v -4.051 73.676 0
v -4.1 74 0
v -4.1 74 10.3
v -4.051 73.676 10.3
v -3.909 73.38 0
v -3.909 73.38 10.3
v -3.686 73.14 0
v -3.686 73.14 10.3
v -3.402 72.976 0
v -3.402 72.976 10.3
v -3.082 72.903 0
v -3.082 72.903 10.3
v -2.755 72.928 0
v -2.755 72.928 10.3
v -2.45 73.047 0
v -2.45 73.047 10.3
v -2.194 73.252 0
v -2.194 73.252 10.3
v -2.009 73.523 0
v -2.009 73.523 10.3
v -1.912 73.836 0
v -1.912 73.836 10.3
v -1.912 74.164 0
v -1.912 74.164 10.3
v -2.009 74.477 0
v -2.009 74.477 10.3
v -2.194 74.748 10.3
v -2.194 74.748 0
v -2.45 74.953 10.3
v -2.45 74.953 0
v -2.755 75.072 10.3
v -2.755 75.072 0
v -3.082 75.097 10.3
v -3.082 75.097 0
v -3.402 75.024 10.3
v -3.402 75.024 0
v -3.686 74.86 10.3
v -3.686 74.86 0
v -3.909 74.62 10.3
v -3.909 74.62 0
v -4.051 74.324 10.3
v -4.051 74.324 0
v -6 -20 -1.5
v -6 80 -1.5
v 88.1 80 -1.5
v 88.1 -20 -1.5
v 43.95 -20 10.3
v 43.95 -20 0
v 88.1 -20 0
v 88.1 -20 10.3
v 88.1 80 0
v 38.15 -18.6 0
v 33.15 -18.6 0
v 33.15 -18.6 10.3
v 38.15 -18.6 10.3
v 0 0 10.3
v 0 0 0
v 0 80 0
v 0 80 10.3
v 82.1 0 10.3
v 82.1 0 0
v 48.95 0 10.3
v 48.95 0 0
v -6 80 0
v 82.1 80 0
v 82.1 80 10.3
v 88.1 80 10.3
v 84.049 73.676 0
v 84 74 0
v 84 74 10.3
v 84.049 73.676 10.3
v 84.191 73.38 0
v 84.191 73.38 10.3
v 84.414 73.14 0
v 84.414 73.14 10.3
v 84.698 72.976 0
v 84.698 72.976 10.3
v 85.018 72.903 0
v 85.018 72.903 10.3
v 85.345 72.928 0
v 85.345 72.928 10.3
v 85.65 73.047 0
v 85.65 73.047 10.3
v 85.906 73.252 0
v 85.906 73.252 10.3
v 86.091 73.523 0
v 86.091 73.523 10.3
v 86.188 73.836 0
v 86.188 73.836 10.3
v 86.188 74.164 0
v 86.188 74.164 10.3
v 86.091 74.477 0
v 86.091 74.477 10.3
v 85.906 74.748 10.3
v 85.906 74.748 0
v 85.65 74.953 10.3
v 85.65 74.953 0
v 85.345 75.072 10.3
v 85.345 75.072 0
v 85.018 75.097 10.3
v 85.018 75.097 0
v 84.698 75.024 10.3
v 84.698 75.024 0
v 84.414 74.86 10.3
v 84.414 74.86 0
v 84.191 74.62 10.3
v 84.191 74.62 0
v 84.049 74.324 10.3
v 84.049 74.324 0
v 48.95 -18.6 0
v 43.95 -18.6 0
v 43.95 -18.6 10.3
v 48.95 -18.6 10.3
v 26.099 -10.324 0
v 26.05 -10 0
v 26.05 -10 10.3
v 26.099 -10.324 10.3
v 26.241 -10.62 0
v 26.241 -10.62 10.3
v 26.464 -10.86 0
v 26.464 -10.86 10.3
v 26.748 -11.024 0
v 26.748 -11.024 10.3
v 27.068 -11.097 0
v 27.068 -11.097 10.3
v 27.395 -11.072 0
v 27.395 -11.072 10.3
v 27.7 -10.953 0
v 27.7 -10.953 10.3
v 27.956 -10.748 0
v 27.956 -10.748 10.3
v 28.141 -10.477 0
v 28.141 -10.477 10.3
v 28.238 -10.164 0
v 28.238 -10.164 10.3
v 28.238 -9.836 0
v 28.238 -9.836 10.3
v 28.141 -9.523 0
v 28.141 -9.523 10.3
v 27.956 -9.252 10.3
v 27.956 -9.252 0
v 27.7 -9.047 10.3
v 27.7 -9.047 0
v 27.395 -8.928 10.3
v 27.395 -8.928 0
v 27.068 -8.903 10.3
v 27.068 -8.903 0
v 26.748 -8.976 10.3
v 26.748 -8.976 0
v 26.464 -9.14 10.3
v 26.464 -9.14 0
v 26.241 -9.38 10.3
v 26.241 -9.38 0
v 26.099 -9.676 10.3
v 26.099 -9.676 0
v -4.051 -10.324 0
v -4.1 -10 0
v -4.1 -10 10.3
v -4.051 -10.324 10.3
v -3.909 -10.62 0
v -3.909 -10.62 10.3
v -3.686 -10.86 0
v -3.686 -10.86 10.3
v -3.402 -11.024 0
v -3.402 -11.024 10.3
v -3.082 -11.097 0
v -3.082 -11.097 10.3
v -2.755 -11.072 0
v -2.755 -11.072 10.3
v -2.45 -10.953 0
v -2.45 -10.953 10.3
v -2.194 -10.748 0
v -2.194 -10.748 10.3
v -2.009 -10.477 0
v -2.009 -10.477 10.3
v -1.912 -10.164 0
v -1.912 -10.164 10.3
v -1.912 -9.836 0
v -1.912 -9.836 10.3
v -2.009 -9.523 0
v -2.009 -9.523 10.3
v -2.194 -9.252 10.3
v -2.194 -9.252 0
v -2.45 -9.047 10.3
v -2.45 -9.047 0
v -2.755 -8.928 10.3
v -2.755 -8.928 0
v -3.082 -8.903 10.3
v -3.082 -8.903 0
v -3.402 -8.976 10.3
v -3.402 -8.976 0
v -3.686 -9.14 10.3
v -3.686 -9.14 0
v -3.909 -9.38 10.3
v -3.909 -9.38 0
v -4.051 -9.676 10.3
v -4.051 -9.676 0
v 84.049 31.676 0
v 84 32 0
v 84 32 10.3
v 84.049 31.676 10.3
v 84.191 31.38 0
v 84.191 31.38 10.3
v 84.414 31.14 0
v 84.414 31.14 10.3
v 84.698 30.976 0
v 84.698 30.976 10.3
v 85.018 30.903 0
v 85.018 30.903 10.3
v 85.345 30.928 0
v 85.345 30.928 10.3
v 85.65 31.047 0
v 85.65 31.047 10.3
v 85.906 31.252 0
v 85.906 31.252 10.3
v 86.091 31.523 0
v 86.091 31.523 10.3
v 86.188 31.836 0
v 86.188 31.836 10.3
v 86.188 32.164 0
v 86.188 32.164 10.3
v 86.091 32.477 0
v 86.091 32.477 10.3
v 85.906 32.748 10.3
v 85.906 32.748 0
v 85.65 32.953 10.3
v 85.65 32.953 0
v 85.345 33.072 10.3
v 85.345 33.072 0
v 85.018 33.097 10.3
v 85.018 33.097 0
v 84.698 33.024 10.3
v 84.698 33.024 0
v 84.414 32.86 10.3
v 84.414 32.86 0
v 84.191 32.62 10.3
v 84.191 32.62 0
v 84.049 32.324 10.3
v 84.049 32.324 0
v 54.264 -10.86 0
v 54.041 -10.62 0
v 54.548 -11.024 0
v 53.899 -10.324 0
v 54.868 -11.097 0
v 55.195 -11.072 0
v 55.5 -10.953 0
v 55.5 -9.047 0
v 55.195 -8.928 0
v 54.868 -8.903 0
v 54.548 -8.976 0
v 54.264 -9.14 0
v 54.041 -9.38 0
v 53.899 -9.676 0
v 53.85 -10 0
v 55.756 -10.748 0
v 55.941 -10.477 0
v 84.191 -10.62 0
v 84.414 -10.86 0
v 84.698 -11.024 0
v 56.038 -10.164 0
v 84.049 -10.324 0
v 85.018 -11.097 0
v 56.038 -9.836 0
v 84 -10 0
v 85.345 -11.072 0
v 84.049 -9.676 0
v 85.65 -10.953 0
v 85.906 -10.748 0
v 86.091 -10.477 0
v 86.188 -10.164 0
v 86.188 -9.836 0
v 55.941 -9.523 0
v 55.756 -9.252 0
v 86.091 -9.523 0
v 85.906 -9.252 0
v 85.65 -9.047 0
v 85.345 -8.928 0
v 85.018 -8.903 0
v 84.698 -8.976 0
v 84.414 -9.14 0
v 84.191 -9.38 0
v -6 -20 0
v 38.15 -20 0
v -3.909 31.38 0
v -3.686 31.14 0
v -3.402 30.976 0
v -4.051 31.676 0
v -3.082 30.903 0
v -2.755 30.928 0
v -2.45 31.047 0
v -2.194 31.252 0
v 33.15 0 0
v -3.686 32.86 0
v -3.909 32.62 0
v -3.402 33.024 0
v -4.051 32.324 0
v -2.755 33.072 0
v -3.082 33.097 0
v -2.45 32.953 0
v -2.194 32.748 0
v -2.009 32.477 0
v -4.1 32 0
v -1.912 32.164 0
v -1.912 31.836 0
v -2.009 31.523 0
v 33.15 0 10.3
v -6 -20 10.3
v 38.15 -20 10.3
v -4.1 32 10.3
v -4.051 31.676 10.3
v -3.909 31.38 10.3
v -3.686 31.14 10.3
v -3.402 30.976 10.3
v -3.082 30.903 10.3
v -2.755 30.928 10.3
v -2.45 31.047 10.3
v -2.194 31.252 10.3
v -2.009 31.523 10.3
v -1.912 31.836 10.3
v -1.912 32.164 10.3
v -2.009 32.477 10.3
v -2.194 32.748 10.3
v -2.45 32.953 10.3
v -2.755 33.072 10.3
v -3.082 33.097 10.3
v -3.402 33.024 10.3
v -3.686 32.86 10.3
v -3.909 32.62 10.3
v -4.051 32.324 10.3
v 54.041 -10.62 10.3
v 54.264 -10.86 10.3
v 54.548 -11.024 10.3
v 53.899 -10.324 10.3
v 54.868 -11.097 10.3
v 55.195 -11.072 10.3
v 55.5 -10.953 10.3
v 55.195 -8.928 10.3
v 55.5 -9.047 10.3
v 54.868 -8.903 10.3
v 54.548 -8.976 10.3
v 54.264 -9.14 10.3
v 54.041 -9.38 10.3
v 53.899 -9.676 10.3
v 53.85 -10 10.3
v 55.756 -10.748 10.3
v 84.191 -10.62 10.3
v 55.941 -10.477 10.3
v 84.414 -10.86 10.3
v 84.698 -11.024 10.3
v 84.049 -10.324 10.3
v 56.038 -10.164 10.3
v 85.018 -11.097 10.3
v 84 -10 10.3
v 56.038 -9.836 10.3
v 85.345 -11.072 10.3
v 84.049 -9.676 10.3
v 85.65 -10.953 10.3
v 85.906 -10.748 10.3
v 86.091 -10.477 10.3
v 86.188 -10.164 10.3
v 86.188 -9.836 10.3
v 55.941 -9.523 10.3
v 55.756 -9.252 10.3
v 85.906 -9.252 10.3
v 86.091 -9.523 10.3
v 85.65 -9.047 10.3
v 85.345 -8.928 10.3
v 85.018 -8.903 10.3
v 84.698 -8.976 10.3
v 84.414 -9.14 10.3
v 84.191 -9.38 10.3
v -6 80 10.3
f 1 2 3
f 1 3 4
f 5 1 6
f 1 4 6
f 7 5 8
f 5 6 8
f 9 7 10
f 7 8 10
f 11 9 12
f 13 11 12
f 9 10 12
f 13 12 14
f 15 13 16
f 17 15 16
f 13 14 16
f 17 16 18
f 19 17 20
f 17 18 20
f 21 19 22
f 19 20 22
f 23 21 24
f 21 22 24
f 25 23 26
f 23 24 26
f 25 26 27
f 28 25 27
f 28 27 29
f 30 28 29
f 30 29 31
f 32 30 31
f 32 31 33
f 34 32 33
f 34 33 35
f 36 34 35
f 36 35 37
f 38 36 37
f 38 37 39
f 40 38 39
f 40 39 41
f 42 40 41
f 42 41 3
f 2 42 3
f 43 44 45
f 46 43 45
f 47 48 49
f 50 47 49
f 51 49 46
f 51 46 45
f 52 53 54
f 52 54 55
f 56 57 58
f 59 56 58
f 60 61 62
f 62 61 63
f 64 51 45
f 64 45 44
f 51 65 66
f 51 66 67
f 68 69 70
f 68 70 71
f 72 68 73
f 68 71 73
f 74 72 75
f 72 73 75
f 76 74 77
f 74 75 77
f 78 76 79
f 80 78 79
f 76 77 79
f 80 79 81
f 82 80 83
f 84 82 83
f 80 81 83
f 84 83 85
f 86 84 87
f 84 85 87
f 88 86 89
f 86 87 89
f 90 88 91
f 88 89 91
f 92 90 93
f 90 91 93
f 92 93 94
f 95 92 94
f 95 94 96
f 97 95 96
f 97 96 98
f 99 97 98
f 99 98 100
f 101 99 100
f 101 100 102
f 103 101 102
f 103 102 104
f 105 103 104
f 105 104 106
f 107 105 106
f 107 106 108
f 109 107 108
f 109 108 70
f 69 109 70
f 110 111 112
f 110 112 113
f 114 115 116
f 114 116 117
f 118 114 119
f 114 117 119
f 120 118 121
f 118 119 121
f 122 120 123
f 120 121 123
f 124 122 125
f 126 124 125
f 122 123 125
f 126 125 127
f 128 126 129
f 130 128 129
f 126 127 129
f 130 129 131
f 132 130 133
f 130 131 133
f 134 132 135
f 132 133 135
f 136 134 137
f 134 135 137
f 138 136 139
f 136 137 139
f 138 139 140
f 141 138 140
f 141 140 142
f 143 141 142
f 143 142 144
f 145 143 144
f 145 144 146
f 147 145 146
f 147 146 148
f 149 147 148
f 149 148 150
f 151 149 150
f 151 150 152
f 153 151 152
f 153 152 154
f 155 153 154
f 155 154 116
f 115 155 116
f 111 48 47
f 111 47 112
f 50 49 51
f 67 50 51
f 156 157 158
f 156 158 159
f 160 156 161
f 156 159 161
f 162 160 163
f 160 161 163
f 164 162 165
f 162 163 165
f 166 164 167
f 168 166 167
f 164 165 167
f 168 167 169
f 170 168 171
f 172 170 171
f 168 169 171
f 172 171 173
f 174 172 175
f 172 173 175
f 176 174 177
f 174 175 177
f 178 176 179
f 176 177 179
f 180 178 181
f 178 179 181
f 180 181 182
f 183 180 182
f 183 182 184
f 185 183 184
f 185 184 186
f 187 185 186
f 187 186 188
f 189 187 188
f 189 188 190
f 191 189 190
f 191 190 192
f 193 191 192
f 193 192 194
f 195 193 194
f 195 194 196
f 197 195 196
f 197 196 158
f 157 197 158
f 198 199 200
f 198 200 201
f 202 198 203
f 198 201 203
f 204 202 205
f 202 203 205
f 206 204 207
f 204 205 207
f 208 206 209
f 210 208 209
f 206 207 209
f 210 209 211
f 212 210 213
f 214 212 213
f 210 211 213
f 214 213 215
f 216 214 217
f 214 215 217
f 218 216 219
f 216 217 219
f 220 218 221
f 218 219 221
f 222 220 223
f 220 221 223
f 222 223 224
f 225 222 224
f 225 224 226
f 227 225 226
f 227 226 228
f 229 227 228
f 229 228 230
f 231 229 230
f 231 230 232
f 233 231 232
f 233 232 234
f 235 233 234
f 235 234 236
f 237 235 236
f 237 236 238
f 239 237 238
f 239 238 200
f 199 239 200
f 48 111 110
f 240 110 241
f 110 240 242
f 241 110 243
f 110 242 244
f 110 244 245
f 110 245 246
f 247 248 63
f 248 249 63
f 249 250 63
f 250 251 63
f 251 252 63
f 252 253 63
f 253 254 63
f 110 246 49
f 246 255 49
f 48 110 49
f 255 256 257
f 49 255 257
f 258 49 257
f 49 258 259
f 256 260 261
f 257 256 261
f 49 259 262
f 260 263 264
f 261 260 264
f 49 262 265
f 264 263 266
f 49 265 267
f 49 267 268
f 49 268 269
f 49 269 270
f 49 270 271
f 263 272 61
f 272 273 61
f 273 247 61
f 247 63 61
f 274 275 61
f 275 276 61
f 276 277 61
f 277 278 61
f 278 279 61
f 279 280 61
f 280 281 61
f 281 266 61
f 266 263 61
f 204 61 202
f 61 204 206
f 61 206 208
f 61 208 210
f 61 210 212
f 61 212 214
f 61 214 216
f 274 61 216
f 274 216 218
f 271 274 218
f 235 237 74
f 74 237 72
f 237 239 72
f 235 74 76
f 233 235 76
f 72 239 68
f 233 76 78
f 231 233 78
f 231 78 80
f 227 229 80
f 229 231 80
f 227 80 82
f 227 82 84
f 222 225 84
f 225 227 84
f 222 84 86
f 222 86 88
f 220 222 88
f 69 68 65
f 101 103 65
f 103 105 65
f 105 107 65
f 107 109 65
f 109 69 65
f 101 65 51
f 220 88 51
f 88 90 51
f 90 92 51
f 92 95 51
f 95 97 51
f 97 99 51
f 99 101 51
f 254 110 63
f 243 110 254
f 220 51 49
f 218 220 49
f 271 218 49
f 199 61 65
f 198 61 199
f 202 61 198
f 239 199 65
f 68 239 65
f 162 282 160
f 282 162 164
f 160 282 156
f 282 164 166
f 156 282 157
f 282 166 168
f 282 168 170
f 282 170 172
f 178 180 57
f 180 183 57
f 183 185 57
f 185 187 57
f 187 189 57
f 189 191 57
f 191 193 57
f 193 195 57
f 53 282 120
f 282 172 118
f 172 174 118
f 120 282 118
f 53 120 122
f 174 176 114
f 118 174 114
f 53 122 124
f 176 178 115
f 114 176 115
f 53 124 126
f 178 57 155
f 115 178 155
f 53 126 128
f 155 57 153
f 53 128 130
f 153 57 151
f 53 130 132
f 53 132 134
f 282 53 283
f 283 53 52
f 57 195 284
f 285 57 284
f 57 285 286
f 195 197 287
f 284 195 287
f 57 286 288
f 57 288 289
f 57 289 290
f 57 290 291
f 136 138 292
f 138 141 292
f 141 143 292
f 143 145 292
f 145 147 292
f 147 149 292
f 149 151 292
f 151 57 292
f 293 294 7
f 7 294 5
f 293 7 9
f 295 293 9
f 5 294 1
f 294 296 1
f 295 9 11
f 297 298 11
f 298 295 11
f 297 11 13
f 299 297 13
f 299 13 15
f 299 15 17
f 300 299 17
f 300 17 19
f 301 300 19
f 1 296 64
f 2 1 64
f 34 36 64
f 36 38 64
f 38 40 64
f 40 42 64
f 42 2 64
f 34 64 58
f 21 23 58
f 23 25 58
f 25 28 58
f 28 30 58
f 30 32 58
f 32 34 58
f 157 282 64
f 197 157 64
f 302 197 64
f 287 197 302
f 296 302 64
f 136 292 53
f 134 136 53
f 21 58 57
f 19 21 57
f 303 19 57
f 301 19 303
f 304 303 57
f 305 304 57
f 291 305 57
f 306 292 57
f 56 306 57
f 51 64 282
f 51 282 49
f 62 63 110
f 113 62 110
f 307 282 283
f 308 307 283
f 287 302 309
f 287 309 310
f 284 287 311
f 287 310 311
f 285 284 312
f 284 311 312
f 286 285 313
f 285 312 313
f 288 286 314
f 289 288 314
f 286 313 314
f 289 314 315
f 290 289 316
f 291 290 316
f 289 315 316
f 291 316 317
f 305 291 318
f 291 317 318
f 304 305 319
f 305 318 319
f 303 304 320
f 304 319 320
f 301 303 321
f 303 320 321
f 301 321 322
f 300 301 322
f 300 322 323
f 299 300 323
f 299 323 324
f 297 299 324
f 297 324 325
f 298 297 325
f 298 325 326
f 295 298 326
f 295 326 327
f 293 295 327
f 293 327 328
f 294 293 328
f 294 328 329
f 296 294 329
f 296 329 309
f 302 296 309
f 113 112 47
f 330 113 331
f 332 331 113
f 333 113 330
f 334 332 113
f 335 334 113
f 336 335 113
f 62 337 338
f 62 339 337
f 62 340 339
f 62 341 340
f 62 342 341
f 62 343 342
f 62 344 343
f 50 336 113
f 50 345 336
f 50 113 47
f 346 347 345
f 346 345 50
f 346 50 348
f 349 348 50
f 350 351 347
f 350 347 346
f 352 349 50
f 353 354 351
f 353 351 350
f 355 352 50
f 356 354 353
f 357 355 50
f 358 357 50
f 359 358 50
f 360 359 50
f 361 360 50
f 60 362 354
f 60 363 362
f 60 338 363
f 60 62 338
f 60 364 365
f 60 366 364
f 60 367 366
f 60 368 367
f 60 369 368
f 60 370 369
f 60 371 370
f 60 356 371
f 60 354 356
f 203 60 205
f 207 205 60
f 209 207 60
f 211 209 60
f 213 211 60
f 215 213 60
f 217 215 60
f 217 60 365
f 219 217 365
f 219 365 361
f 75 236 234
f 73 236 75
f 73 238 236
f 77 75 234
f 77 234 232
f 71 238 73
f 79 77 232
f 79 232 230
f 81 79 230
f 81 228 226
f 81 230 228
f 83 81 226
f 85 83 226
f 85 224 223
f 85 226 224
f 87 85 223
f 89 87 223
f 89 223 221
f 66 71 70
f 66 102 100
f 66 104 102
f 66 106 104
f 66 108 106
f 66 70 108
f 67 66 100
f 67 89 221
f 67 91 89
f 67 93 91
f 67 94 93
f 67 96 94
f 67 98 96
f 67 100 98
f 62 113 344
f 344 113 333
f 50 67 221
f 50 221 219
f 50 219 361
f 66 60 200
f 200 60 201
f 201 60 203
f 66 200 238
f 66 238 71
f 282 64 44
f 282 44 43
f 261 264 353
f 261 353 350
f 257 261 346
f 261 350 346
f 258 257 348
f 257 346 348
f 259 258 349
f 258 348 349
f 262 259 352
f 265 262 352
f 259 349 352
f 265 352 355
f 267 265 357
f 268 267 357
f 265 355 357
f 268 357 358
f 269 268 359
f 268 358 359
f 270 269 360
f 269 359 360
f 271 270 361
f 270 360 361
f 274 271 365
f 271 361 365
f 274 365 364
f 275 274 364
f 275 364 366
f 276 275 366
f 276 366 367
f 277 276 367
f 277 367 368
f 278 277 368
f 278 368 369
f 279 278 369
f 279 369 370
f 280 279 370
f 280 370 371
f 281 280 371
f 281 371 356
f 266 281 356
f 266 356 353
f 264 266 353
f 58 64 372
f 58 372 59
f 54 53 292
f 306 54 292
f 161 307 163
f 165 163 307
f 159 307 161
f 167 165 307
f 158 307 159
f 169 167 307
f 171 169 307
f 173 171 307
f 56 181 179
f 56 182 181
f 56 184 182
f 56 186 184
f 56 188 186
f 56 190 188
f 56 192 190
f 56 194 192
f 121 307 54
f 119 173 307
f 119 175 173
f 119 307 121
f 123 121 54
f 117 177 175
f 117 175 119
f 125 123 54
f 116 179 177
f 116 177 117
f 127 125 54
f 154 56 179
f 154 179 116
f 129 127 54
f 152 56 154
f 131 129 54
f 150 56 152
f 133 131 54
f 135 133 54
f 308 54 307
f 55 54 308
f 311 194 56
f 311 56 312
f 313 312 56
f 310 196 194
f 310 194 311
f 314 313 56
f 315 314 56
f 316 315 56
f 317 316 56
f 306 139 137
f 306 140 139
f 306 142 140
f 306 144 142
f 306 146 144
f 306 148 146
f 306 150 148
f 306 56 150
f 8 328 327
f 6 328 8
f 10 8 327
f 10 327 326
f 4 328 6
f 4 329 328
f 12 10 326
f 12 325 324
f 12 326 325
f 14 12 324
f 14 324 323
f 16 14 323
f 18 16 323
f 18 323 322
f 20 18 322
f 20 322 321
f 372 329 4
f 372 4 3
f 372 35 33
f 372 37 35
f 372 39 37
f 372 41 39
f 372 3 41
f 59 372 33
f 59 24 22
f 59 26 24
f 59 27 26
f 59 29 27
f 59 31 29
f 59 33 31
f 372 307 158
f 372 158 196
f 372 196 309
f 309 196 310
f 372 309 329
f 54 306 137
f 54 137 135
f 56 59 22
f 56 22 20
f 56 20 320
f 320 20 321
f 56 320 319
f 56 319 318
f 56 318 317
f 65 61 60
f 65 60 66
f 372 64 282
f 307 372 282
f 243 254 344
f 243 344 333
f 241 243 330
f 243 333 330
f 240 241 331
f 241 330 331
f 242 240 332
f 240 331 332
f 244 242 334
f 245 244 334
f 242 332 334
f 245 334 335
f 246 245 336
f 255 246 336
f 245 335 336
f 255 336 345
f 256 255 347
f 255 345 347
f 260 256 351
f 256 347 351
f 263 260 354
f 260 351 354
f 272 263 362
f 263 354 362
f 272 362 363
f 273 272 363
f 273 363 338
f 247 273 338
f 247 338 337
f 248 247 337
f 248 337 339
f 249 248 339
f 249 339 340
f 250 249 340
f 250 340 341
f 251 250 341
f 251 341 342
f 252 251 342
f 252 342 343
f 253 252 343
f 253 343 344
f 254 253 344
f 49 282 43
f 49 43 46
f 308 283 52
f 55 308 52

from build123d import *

# Parameters (mm, degrees)
F0_W     = 6
F0_H     = 80
F0_W_2   = 5
F0_H_2   = 1.4
F1_DEPTH = 10.3
F0_W_3   = 5.8
F2_DEPTH = 1.5
F3_D     = 2.2
F3_2_D   = 2.2


with BuildPart() as f1:
    # F0 (on Top) → F1 (new body)
    with BuildSketch(Plane.XY):
        with Locations((-3, 40)):
            Rectangle(F0_W, F0_H)
        Polygon((33.15, 0), (0, 0), (-6, 0), (-6, -20), (33.15, -20), (33.15, -18.6), align=None)
        with Locations((35.65, -19.3)):
            Rectangle(F0_W_2, F0_H_2)
    extrude(amount=F1_DEPTH)

    # F3 (through all)
    with Locations(Plane(origin=(0, 0, 0), x_dir=(1, 0, 0), z_dir=(0, 0, -1))):
        with Locations((-3, -74), (85.1, -74), (85.1, -32), (-3, -32), (-3, 10), (27.15, 10), (54.95, 10), (85.1, 10)):
            Hole(F3_D / 2)


with BuildPart() as f1b:
    # F0 (on Top) → F1, piece 2 (new body)
    with BuildSketch(Plane.XY):
        Polygon((82.1, 0), (48.95, 0), (48.95, -18.6), (48.95, -20), (88.1, -20), (88.1, 0), align=None)
        with Locations((85.1, 40)):
            Rectangle(F0_W, F0_H)
        with Locations((46.45, -19.3)):
            Rectangle(F0_W_2, F0_H_2)
    extrude(amount=F1_DEPTH)

    # F3#2 (through all)
    with Locations(Plane(origin=(0, 0, 0), x_dir=(1, 0, 0), z_dir=(0, 0, -1))):
        with Locations((-3, -74), (85.1, -74), (85.1, -32), (-3, -32), (-3, 10), (27.15, 10), (54.95, 10), (85.1, 10)):
            Hole(F3_2_D / 2)


with BuildPart() as f2:
    # F0 (on Top) → F2 (new body)
    with BuildSketch(Plane.XY):
        Polygon((0, 80), (0, 0), (33.15, 0), (48.95, 0), (82.1, 0), (82.1, 80), align=None)
        with Locations((-3, 40)):
            Rectangle(F0_W, F0_H)
        Polygon((33.15, 0), (0, 0), (-6, 0), (-6, -20), (33.15, -20), (33.15, -18.6), align=None)
        Polygon((82.1, 0), (48.95, 0), (48.95, -18.6), (48.95, -20), (88.1, -20), (88.1, 0), align=None)
        with Locations((35.65, -19.3)):
            Rectangle(F0_W_2, F0_H_2)
        with Locations((85.1, 40)):
            Rectangle(F0_W, F0_H)
        with Locations((46.45, -19.3)):
            Rectangle(F0_W_2, F0_H_2)
        with Locations((41.05, -19.3)):
            Rectangle(F0_W_3, F0_H_2)
        Polygon((48.95, 0), (33.15, 0), (33.15, -18.6), (38.15, -18.6), (43.95, -18.6), (48.95, -18.6), align=None)
    extrude(amount=-F2_DEPTH)


solid = Compound([f1.part, f1b.part, f2.part])
